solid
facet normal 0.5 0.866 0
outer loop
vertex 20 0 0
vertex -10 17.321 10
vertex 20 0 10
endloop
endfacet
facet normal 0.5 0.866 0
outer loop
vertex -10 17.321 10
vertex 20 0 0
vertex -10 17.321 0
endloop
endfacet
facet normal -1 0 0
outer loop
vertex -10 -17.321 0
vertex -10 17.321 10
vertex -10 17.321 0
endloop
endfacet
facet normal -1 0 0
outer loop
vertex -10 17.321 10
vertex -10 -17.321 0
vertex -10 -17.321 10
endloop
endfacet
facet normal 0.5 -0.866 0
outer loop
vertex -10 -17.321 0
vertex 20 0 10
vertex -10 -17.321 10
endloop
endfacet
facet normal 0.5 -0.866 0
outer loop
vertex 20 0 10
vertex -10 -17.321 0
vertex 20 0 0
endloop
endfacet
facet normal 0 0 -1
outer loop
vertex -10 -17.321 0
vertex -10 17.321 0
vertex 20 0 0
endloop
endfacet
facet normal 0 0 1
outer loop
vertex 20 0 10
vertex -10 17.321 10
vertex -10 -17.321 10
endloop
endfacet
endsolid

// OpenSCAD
module base_plate() {
    difference() {
        union() {
            translate([1, 1, 0]) minkowski($fn=32){
                cube([43,43,4]);
                cylinder(1);
            }
            translate([4.5, 17.5, 5]) 
            minkowski() {
                cube([36, 10, 31]);
                cylinder(1);
            }
            translate([23, 16, 6]) rotate([90, 45, 0]) cylinder(r1=20, r2=2.5, h=16, $fn=4);
            translate([23, 29, 6]) rotate([90, 45, 180]) cylinder(r1=20, r2=2.5, h=16, $fn=4);
        }
        
        translate([0,0,-10]) cube([45, 45, 10]);
        
        // holes
        $fn=32;
        translate([11, 11]) cylinder(d=4.1, h=2);
        translate([34, 11]) cylinder(d=4.1, h=2);
        translate([11, 34]) cylinder(d=4.1, h=2);
        translate([34, 34]) cylinder(d=4.1, h=2);
        
        // clamp holes & nut traps
        translate([9.5, 22.5, 23]) cylinder(d=4.1, h=14);
        translate([35.5, 22.5, 23]) cylinder(d=4.1, h=14);
        
        translate([32, 16, 28]) cube([7.1, 13, 3.5]);
        translate([6, 16, 28]) cube([7.1, 13, 3.5]);
        
        // nut traps
        translate([11, 11, 2]) cylinder(d=7.75, h=18, $fn=6);
        translate([34, 11, 2]) cylinder(d=7.75, h=18, $fn=6);
        translate([11, 34, 2]) cylinder(d=7.75, h=18, $fn=6);
        translate([34, 34, 2]) cylinder(d=7.75, h=18, $fn=6);
        
        // holes for hotend
        translate([22.5, 26, 37]) rotate([90]) cylinder(d=12, h=6);
        translate([22.5, 29, 37]) rotate([90]) cylinder(d=16, h=3);
        translate([22.5, 20, 37]) rotate([90]) cylinder(d=16, h=4);
    }
}

module nut() {
    cylinder(d=7.74, h=3.3, $fn=6);
}

$fn=32;
//base_plate();
//translate([35.6, 22.5, 28]) color("green") rotate([0, 0, 30]) nut();

cylinder(r1=20, r2=20, h=10, $fn=3);
